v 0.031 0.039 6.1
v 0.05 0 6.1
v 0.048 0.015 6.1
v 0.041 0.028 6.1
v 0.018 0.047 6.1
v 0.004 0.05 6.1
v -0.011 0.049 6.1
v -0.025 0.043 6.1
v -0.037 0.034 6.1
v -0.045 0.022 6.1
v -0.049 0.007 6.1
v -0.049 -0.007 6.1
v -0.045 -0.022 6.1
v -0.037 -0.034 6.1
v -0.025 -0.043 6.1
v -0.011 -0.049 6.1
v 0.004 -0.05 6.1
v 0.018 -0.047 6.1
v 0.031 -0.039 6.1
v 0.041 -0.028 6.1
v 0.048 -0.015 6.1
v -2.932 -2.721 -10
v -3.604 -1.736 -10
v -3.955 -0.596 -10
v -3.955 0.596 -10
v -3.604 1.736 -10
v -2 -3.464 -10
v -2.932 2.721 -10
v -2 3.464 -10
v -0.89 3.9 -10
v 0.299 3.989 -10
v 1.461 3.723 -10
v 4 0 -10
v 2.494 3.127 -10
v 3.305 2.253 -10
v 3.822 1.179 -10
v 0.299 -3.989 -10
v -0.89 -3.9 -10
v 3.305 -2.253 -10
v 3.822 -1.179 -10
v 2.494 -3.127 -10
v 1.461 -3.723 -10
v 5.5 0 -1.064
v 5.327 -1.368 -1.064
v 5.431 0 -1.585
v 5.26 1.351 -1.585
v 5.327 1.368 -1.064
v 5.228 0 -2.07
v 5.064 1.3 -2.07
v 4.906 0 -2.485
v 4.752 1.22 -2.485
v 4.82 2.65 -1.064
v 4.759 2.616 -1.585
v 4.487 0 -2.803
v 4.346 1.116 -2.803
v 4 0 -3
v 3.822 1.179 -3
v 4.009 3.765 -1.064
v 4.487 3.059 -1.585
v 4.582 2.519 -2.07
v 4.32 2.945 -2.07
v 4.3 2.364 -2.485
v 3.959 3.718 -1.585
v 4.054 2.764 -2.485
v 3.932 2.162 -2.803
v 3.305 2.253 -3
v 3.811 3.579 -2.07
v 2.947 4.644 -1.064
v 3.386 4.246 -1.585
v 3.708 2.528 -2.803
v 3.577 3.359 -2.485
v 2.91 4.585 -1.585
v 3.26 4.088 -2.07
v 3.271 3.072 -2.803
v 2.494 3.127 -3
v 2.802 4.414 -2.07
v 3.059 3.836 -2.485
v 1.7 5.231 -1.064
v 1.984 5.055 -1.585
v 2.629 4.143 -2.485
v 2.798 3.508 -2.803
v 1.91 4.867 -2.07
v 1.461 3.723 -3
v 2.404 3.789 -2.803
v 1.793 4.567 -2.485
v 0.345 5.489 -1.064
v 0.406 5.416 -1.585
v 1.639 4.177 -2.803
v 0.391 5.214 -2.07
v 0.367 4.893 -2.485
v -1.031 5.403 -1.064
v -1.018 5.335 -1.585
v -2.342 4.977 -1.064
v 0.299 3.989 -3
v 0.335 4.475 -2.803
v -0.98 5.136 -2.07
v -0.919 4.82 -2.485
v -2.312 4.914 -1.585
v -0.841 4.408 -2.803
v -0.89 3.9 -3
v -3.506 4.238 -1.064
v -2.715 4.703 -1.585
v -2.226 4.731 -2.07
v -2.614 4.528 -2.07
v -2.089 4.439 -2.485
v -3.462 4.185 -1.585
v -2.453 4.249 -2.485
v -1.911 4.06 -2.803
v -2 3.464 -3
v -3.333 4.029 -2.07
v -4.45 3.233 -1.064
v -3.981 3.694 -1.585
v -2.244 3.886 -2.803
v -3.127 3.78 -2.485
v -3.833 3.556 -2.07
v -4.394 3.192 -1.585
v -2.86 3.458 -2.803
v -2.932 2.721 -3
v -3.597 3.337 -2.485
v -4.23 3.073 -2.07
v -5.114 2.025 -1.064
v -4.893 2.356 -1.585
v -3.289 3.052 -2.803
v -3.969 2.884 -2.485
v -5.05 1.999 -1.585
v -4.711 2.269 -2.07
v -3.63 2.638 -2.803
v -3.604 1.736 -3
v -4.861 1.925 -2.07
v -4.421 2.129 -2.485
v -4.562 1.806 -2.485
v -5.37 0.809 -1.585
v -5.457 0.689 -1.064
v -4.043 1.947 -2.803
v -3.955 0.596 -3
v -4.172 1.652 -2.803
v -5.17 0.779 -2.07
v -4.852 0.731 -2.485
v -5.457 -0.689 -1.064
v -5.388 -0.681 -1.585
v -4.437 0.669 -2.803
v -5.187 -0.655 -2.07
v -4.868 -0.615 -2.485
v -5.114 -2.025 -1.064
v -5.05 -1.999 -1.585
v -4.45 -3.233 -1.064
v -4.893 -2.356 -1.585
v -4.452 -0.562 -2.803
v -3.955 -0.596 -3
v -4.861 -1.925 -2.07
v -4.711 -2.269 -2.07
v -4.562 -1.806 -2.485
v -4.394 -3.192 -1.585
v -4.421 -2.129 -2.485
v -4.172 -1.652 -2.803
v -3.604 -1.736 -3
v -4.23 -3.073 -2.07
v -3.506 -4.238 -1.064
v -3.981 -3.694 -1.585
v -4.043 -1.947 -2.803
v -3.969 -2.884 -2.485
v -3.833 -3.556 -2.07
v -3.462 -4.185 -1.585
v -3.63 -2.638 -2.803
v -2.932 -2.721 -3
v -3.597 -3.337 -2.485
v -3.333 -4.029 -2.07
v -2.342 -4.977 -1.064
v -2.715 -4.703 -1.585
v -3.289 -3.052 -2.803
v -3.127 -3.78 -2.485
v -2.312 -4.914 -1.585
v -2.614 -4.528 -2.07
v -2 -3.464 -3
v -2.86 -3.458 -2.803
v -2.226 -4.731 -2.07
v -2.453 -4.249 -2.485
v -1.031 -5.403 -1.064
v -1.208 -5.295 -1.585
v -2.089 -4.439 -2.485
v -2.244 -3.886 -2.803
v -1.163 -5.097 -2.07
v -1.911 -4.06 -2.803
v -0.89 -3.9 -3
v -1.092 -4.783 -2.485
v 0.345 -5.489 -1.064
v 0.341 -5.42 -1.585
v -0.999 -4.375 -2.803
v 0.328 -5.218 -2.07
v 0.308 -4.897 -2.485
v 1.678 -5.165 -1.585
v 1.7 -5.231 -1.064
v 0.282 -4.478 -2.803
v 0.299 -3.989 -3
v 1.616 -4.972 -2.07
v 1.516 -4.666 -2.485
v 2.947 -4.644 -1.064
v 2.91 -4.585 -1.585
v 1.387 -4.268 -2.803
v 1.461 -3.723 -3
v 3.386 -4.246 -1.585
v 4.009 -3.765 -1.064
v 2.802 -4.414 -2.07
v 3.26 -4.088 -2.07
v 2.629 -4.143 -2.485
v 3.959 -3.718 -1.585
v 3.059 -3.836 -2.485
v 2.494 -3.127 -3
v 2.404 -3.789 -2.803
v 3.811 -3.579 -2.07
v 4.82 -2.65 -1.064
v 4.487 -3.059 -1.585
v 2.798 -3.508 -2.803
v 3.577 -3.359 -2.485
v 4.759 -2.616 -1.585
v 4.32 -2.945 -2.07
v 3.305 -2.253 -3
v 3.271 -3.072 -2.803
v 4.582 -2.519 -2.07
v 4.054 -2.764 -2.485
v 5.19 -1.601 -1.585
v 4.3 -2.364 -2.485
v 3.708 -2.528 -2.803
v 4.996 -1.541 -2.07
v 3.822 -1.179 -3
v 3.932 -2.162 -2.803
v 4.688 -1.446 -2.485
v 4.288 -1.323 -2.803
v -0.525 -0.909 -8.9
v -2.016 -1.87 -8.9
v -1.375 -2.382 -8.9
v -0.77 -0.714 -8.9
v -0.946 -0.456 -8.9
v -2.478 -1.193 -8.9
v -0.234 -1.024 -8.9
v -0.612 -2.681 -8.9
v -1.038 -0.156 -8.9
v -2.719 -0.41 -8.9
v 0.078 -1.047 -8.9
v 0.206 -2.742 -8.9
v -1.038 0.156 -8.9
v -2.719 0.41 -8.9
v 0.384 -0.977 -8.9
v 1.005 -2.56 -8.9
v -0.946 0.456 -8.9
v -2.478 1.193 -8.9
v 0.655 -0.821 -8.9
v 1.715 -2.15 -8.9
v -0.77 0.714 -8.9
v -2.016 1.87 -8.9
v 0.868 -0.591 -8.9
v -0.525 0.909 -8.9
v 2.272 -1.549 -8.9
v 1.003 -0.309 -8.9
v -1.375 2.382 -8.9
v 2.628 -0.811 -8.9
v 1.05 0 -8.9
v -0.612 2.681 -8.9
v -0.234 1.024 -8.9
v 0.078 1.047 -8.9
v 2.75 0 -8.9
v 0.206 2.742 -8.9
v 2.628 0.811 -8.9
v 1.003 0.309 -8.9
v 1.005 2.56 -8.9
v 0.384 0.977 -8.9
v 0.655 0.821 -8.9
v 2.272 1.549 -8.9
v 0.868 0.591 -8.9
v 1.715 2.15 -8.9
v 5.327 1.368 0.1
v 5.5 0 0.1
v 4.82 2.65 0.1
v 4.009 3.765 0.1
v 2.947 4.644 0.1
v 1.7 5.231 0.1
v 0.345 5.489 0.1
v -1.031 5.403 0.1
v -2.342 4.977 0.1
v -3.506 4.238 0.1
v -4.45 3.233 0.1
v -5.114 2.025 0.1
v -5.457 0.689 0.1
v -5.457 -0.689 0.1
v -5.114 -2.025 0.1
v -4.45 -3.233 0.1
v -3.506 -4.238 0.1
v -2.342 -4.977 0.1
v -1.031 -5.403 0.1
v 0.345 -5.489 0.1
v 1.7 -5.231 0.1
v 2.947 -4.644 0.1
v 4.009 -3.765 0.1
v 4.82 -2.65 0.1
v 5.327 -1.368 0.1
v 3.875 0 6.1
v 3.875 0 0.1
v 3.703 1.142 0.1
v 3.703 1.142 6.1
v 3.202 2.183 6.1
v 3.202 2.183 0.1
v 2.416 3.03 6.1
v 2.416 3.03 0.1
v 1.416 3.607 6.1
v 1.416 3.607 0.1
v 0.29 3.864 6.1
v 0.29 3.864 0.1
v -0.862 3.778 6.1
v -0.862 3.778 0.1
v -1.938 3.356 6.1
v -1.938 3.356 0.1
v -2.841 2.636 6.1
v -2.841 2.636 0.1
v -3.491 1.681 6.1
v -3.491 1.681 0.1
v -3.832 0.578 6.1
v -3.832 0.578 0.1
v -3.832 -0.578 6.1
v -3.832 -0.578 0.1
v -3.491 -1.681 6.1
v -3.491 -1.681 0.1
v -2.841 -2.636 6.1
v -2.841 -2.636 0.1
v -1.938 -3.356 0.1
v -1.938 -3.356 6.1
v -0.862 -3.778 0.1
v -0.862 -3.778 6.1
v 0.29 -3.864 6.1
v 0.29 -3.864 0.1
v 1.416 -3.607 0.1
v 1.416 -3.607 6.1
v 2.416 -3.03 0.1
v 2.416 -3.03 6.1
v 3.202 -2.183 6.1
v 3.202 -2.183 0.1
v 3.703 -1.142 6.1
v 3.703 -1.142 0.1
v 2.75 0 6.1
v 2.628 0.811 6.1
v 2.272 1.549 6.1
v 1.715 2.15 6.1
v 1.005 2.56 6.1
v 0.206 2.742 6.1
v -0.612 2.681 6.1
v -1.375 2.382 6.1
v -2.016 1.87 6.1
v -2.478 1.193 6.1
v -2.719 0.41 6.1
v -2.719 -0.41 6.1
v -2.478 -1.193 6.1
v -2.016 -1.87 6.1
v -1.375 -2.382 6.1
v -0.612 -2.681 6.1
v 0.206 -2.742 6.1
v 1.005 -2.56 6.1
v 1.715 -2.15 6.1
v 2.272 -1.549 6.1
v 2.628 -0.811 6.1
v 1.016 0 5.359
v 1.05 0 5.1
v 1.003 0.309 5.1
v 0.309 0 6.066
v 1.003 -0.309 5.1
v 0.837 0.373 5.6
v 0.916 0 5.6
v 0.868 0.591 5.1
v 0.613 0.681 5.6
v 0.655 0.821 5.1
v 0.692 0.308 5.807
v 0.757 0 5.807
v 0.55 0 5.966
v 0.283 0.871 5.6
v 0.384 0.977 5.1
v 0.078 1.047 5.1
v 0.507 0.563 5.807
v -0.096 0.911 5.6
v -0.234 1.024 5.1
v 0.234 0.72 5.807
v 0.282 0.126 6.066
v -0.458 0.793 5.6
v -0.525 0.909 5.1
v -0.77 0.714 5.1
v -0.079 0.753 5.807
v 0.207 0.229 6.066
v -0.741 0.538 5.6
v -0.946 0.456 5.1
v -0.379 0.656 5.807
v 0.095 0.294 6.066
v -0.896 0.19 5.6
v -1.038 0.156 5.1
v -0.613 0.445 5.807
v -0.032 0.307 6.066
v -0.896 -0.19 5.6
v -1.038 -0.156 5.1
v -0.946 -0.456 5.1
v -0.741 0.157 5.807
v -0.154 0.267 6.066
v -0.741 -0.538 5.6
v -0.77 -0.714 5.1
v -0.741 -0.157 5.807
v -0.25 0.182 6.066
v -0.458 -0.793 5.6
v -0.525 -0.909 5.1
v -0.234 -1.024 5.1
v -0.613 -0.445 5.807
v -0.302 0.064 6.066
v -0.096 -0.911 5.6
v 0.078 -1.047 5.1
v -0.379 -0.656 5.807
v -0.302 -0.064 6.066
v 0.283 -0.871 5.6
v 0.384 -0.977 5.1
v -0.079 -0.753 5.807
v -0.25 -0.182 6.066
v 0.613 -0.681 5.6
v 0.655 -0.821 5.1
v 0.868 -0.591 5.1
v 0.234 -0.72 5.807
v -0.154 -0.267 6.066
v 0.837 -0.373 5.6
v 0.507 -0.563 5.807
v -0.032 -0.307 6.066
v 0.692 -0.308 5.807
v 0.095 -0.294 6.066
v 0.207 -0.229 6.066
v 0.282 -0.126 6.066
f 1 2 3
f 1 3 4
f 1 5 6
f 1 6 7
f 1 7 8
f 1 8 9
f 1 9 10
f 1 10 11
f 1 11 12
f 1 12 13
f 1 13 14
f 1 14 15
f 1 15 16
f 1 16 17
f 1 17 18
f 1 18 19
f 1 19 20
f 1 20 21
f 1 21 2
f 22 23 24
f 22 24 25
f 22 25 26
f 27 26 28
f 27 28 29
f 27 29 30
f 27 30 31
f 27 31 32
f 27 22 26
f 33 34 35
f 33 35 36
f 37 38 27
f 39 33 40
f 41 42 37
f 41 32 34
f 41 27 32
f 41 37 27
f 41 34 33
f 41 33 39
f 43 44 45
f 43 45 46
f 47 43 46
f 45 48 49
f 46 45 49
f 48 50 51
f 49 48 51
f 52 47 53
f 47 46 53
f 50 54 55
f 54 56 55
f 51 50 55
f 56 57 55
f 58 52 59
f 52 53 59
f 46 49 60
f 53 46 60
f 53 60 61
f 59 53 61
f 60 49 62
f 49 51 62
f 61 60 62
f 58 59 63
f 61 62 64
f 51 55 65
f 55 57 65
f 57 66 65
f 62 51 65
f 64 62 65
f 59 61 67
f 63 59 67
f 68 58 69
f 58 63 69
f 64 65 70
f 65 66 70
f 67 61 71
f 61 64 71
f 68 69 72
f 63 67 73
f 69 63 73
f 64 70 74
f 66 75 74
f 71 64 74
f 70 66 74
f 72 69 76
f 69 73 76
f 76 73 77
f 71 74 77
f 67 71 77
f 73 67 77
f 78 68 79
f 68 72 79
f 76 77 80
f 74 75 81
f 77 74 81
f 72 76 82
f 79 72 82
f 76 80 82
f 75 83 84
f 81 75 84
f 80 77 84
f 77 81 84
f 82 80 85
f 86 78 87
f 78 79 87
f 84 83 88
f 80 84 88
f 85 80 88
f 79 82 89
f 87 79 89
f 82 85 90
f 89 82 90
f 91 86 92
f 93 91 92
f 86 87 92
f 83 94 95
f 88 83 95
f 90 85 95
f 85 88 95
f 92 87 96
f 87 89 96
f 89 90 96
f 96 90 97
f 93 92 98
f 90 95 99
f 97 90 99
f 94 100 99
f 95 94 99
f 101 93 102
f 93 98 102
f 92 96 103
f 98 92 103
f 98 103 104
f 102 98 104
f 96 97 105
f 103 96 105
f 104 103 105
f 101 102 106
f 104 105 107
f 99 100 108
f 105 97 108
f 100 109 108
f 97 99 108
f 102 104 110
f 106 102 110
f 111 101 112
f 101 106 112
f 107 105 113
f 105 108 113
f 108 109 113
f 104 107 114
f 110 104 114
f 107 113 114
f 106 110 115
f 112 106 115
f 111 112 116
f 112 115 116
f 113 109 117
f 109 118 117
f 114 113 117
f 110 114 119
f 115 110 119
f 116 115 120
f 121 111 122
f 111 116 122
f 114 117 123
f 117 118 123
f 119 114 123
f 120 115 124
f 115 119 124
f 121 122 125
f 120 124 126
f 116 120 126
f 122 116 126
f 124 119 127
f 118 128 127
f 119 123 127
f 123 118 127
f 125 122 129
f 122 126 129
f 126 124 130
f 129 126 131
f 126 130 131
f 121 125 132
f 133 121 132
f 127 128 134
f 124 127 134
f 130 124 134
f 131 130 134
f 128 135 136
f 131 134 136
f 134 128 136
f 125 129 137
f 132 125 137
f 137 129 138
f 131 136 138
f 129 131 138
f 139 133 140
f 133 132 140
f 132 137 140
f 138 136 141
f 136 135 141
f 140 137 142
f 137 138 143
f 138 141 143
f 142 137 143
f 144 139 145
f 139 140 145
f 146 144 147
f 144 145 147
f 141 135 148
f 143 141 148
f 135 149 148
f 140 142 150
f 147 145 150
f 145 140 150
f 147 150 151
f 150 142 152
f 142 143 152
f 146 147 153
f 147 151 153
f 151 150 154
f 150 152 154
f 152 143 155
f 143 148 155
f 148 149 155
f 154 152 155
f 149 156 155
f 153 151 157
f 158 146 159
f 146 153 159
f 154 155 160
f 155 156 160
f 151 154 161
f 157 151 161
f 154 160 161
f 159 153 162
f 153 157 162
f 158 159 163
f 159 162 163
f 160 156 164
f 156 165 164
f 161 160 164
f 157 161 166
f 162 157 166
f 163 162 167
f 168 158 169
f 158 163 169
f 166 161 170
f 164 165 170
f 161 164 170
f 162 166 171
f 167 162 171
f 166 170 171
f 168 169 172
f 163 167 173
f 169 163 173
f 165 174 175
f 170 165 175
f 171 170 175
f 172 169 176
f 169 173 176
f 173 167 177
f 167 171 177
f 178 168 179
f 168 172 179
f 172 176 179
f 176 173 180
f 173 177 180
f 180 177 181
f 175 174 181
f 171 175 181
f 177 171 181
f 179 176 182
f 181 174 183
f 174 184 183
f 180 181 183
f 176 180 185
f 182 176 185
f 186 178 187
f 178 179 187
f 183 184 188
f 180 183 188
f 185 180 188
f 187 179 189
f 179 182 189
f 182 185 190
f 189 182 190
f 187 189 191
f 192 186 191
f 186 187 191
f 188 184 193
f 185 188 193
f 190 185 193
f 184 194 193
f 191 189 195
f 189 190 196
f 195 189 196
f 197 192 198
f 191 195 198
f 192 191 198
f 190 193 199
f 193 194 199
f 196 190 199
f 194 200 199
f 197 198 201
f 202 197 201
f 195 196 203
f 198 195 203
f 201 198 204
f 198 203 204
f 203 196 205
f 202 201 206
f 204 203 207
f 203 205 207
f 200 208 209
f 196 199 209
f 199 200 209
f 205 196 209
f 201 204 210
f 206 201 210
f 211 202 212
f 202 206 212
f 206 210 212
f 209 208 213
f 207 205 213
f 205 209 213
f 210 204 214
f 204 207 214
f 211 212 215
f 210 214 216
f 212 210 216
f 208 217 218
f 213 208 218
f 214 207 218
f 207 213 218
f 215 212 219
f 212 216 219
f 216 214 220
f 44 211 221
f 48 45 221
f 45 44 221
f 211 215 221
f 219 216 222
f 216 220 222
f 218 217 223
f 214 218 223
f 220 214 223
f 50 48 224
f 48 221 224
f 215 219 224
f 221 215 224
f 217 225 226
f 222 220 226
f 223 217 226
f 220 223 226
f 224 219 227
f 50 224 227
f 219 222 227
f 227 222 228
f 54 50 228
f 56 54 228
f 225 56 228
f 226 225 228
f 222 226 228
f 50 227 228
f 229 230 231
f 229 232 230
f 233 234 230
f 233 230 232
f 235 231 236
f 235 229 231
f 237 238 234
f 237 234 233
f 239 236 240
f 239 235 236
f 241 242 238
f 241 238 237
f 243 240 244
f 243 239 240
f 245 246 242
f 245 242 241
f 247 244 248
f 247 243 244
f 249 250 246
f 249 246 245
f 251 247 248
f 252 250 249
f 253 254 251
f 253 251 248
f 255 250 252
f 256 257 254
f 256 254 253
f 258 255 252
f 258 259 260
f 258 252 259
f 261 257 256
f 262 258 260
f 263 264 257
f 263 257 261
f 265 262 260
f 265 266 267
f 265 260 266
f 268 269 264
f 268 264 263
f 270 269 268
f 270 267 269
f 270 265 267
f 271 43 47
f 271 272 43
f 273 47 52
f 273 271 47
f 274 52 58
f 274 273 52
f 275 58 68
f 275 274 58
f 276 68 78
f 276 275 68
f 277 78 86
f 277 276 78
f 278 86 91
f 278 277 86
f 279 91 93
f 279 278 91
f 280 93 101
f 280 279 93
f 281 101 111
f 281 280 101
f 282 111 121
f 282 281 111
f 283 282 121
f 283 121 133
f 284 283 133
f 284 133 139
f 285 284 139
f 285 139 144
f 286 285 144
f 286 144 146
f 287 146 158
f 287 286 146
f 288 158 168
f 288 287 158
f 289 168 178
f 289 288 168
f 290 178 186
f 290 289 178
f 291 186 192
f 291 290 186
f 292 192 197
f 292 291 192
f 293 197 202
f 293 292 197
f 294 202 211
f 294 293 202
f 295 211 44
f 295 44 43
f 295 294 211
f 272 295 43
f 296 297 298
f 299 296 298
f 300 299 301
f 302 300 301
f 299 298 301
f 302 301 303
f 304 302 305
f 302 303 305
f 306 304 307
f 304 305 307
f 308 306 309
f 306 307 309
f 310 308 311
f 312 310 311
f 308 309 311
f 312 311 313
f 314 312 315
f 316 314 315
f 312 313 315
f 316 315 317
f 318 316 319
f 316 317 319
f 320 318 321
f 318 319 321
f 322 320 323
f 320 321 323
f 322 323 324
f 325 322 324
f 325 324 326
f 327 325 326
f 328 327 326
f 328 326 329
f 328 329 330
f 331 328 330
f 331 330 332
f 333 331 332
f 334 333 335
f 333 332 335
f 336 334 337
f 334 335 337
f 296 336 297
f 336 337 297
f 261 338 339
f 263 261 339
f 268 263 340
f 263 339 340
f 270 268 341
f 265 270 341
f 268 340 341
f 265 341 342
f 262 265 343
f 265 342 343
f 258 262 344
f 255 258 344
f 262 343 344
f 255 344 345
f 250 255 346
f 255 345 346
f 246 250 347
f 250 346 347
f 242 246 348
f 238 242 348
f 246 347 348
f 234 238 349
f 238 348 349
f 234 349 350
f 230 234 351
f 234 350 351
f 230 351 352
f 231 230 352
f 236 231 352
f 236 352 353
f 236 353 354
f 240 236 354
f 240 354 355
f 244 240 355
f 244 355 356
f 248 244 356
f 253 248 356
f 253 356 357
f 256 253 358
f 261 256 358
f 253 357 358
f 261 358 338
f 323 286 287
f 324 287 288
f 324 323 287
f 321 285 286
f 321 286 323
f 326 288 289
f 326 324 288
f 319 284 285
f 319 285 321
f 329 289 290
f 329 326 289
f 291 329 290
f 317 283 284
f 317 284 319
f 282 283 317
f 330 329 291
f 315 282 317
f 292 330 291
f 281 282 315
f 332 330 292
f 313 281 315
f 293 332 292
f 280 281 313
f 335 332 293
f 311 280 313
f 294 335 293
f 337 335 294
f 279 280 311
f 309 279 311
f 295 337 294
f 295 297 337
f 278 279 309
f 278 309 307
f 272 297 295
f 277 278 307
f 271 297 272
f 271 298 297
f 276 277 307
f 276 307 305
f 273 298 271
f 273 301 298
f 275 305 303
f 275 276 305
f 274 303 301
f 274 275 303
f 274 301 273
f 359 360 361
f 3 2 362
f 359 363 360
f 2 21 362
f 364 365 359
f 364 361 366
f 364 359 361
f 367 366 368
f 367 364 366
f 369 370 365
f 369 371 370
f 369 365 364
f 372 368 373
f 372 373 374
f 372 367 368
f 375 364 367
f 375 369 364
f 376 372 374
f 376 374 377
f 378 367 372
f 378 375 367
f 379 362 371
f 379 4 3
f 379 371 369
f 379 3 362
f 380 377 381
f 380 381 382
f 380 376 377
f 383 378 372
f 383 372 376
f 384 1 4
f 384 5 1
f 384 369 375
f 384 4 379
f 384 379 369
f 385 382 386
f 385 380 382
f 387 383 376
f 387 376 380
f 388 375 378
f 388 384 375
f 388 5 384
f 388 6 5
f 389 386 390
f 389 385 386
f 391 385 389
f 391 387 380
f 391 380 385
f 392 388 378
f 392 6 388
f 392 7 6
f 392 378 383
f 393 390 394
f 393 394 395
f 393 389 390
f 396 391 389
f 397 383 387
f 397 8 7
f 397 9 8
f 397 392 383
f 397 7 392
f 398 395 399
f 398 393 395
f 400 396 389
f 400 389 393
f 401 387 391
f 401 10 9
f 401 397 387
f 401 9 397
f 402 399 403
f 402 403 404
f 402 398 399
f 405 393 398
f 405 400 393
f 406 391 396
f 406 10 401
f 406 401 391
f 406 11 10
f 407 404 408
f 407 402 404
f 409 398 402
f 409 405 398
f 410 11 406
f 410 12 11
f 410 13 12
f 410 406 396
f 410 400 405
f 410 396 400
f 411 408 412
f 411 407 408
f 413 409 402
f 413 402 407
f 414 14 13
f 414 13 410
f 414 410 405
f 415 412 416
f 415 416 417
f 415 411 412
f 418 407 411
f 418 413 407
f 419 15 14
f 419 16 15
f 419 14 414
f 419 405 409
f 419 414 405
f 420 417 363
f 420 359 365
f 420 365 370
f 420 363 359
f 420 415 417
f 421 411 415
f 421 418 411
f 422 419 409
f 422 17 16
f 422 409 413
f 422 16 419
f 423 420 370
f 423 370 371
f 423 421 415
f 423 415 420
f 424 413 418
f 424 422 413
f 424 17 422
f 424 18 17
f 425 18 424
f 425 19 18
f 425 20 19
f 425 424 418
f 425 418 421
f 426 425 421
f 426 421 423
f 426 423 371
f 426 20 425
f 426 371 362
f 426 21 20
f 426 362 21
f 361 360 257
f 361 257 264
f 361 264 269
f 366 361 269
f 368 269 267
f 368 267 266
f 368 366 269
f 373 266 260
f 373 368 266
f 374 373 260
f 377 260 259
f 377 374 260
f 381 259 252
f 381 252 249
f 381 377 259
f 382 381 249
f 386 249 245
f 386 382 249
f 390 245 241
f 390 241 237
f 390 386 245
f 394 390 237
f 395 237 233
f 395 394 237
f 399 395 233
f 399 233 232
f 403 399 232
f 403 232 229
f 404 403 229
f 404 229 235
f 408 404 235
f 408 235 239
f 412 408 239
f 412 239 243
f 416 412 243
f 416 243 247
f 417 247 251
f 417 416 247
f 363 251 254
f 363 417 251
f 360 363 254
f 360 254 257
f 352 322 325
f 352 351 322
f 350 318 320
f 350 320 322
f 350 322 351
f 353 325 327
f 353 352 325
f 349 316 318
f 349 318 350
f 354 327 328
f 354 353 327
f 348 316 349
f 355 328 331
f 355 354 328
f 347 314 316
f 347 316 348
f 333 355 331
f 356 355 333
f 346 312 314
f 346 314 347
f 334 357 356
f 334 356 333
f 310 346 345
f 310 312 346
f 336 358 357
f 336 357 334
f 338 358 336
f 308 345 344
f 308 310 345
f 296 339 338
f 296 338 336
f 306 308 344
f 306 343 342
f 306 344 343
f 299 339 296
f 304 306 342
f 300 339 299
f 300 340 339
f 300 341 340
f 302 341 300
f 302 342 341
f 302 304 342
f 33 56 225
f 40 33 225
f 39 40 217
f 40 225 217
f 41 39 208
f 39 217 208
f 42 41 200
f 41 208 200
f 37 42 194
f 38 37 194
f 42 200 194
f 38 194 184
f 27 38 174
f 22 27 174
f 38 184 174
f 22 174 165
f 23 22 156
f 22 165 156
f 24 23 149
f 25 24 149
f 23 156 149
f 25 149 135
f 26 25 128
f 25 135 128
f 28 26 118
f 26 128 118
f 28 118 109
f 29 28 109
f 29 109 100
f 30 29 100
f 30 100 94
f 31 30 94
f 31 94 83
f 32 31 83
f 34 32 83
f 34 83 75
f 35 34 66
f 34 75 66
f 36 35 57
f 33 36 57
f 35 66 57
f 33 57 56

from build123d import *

# Parameters (mm, degrees)
F0_R     = 5.5
F1_DEPTH = 0.1
F2_R     = 3.875
F3_DEPTH = 6
F4_DEPTH = 3
F5_R     = 4
F6_DEPTH = 7
F7_R     = 2.75
F7_R_2   = 1.05
F8_DEPTH = 15
F9_R     = 1


# Not quite as in the source:
# - a fillet or chamfer that OpenCascade refuses, or shapes differently, is made with other operations: its cross-section is extruded or revolved along the edge and cut away or added


with BuildPart() as f1:
    # F0 (on Top) → F1 (new body)
    with BuildSketch(Plane.XY):
        Circle(F0_R)
    extrude(amount=F1_DEPTH)

    # F2 (on face) → F3 (join)
    with BuildSketch(Plane.XY.offset(0.1)):
        Circle(F2_R)
    extrude(amount=F3_DEPTH)

    # F0 (on Top) → F4 (join)
    with BuildSketch(Plane.XY):
        Circle(F0_R)
    extrude(amount=-F4_DEPTH)

    # F5 (on face) → F6 (join)
    with BuildSketch(Plane(origin=(0, 0, -3), x_dir=(1, 0, 0), z_dir=(0, 0, -1))):
        Circle(F5_R)
    extrude(amount=F6_DEPTH)

    # F7 (on face) → F8 (cut)
    with BuildSketch(Plane.XY.offset(6.1)):
        Circle(F7_R)
        Circle(F7_R_2, mode=Mode.SUBTRACT)
    extrude(amount=-F8_DEPTH, mode=Mode.SUBTRACT)

    # F9
    f9_edges = [f1.edges().sort_by_distance(p)[0] for p in [
        (-1.05, 0, 6.1),
    ]]
    fillet(f9_edges, radius=F9_R)

    # F10: fillet of radius 2 on 1 edges, made by hand

    # F10_s1 → F10_t2 (revolve, cut)
    with BuildSketch(Plane.XZ):
        with BuildLine():
            ThreePointArc((5.5, -1.0635083269), (5.0811388301, -2.2882531983), (4, -3))
            Line((4, -3), (5.5, -3))
            Line((5.5, -3), (5.5, -1.0635083269))
        make_face()
    revolve(axis=Axis((0, 0, -3), (0, 0, 1)), mode=Mode.SUBTRACT)


solid = f1.part
